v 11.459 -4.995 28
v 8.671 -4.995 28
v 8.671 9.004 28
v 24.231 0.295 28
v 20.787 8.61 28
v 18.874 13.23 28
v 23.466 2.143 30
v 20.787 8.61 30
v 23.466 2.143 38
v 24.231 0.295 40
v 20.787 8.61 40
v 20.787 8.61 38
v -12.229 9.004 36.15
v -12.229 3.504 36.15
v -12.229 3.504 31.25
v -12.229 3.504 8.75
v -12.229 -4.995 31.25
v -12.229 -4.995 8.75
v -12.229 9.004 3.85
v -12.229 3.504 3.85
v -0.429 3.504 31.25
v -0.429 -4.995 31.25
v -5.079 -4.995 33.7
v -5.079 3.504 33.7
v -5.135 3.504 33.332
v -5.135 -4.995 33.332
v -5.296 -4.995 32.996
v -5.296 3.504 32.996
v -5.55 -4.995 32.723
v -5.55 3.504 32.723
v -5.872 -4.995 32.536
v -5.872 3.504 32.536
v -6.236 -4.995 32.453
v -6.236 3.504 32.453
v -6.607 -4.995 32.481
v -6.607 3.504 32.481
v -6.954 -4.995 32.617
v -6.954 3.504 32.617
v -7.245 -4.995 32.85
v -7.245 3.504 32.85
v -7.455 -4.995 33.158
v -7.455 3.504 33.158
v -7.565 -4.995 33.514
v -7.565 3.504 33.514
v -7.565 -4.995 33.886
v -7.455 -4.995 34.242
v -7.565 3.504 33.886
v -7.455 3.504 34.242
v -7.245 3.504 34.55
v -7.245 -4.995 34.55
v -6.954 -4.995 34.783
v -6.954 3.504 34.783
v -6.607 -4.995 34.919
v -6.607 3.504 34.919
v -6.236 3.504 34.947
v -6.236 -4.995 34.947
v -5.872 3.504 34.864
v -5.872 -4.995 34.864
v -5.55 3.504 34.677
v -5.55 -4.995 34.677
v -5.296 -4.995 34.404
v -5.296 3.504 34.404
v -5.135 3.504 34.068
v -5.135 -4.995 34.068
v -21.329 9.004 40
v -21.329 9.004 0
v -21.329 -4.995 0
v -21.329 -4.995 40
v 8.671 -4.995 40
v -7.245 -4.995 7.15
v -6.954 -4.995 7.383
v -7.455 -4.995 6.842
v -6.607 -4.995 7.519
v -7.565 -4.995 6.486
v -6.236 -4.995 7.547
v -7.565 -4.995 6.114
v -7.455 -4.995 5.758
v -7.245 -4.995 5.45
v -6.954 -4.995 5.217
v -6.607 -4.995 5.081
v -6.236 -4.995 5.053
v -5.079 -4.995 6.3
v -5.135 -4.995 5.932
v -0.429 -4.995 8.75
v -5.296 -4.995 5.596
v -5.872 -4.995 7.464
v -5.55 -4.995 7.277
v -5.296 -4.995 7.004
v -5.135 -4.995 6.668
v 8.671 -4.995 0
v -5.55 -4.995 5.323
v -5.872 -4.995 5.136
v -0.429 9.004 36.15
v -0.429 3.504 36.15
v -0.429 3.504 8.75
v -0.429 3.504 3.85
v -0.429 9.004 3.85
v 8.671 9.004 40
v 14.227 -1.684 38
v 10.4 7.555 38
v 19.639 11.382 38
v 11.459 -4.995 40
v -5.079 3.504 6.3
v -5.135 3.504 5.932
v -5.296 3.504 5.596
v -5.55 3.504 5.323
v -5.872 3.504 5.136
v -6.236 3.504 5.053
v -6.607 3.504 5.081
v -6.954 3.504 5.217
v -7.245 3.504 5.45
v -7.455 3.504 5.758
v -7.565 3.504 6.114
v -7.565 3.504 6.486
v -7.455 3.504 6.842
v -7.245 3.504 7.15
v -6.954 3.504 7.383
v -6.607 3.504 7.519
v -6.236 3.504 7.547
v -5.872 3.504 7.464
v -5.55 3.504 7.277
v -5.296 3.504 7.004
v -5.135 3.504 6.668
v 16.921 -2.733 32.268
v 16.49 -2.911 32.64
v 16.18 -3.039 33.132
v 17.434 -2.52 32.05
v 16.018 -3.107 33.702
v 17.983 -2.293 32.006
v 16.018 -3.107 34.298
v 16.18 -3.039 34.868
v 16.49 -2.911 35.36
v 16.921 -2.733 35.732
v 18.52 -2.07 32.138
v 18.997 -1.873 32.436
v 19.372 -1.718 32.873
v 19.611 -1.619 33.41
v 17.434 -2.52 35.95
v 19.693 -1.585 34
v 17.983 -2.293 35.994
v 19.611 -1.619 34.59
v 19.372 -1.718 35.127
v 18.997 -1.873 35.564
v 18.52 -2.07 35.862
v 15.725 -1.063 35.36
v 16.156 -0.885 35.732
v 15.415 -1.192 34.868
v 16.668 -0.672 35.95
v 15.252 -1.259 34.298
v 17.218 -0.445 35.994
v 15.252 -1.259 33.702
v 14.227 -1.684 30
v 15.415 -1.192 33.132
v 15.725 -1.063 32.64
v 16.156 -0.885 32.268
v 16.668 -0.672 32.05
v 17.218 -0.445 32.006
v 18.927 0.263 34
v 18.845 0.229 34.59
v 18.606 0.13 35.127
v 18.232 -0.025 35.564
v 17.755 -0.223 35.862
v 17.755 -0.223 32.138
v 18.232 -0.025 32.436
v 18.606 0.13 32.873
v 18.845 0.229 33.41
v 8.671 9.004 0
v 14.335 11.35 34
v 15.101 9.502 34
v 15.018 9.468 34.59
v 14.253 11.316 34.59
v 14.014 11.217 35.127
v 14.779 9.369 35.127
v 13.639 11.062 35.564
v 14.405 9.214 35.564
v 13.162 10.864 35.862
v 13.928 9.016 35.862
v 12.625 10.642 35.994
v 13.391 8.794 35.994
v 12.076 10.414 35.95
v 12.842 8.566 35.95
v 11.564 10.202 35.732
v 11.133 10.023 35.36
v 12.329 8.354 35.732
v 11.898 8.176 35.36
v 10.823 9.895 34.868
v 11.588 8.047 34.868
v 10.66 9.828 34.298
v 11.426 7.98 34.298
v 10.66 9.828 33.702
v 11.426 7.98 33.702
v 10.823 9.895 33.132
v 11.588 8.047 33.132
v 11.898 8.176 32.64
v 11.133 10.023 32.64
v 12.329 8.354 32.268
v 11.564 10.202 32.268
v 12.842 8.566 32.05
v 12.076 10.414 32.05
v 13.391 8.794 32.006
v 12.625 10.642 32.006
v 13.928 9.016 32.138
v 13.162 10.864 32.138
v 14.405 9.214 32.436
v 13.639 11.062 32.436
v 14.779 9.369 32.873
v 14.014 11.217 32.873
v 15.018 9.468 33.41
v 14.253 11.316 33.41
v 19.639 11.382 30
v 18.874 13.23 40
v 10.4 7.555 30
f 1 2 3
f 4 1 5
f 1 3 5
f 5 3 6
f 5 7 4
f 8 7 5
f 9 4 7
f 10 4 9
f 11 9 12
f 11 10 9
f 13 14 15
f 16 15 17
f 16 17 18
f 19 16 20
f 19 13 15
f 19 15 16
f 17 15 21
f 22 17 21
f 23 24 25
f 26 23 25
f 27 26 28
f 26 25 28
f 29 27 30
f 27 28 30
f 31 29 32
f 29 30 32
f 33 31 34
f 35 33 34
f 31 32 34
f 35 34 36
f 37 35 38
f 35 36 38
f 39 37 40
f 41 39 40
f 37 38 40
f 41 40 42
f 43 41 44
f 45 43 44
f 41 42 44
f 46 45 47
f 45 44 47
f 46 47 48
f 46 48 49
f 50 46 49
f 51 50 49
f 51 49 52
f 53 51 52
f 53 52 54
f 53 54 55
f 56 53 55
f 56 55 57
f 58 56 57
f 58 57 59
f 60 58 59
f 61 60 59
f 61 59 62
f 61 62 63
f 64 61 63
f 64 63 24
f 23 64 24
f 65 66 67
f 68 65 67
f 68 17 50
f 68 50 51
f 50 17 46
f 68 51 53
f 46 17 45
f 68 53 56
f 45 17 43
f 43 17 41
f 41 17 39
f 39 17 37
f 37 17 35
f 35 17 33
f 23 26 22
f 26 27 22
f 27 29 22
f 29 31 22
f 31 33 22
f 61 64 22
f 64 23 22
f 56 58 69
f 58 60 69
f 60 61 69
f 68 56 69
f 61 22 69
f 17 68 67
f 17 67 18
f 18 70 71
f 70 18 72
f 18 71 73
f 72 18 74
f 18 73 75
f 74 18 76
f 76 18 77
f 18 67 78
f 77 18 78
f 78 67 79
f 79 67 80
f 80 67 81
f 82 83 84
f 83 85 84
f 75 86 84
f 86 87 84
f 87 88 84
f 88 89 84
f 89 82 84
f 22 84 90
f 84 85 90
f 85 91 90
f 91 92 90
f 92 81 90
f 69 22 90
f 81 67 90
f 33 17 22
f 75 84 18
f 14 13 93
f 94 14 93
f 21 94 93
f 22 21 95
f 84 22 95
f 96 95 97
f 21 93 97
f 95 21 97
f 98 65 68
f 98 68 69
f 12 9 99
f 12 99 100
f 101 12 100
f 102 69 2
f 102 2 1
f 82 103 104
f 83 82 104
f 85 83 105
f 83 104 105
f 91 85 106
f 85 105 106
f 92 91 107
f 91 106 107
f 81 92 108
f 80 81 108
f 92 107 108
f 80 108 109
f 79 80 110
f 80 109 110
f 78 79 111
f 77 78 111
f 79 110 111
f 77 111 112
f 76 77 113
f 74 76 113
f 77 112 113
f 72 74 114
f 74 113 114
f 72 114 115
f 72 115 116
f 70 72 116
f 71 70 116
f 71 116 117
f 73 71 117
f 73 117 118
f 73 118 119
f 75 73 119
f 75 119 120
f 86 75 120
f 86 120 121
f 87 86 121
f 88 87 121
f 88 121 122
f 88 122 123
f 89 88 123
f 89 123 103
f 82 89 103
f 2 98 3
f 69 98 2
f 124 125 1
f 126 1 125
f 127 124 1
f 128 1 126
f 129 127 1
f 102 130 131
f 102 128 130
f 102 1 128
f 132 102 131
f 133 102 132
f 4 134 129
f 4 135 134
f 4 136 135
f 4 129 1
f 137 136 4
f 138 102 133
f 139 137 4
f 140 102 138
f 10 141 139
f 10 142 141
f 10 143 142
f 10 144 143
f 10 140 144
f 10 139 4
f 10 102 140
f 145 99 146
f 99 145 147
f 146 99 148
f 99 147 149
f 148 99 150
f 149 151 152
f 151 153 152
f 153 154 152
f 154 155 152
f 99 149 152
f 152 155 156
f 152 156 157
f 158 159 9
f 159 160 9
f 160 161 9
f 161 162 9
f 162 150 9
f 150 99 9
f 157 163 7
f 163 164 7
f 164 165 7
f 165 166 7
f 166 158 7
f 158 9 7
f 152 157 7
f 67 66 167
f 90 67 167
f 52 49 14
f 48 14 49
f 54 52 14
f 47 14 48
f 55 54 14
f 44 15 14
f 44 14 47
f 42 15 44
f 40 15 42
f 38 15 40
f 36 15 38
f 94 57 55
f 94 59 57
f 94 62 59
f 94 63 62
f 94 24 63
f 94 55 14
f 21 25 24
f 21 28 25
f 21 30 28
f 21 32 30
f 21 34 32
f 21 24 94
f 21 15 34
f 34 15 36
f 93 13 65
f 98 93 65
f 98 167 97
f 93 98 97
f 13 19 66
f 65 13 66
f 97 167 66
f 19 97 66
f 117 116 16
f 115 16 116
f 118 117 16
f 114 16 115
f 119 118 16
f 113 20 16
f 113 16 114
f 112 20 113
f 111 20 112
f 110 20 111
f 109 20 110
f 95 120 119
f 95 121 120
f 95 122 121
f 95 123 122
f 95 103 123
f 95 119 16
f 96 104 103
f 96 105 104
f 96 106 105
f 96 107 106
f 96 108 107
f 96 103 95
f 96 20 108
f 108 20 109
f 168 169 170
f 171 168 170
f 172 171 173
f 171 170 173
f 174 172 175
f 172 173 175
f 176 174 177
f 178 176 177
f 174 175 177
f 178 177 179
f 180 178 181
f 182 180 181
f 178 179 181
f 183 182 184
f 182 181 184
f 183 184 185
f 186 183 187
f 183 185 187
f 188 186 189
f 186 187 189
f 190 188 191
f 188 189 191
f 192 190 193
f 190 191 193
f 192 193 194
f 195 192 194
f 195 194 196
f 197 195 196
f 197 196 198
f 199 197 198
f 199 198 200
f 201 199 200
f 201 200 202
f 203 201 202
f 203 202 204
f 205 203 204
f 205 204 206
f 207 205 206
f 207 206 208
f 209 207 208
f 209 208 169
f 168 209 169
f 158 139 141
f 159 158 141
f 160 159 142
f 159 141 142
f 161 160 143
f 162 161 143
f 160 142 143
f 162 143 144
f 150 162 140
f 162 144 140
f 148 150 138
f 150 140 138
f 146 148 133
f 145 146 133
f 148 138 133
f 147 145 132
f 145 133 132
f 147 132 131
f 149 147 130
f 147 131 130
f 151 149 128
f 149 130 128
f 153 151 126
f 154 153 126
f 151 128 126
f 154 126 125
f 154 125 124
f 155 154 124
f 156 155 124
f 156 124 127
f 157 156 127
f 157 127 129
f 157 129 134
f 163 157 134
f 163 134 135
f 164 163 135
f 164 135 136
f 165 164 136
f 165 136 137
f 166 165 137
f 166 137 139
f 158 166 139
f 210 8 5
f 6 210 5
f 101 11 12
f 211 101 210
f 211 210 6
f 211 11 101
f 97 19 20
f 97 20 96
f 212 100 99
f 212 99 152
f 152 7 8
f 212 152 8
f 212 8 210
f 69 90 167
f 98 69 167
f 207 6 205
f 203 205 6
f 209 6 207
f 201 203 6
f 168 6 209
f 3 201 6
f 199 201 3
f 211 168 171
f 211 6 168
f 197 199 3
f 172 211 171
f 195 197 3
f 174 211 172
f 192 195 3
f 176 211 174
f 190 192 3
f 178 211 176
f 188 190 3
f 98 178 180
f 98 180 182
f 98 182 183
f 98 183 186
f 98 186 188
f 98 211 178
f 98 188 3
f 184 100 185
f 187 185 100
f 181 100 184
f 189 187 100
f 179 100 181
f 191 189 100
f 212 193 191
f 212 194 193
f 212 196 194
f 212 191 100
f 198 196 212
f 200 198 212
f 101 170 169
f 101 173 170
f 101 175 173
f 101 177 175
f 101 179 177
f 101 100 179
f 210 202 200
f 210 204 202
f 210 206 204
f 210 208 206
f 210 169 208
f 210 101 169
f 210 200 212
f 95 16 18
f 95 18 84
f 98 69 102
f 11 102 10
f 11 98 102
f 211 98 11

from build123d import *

# Parameters (mm, degrees)
BOSS_EXTRUDE1_DEPTH = 40
SKETCH4_W           = 11.8
SKETCH4_H           = 32.3
CUT_EXTRUDE1_DEPTH  = 5.5
SKETCH5_W           = 11.8
SKETCH5_H           = 22.5
CUT_EXTRUDE2_DEPTH  = 9.498848241
SKETCH6_R           = 1.25
CUT_EXTRUDE3_DEPTH  = 9.498848241
BOSS_EXTRUDE2_DEPTH = 12
SKETCH8_R           = 2
CUT_EXTRUDE4_DEPTH  = 30.384991323
SKETCH9_W           = 8
SKETCH9_H           = 10
CUT_EXTRUDE5_DEPTH  = 10


with BuildPart() as part:
    # Sketch1 → Boss-Extrude1 (new body)
    with BuildSketch(Plane.XY):
        Polygon((8.670952565, 9.003587153), (-11.329047435, 9.003587153), (-21.329047435, 9.003587153), (-21.329047435, -4.995261088), (-11.329047435, -4.995261088), (8.670952565, -4.995261088), align=None)
    extrude(amount=BOSS_EXTRUDE1_DEPTH)

    # Sketch4 → Cut-Extrude1 (cut)
    with BuildSketch(Plane(origin=(0, 9.003587153, 0), x_dir=(1, 0, 0), z_dir=(0, 1, 0))):
        with Locations((-6.329047435, -20)):
            Rectangle(SKETCH4_W, SKETCH4_H)
    extrude(amount=-CUT_EXTRUDE1_DEPTH, mode=Mode.SUBTRACT)

    # Sketch5 → Cut-Extrude2 (cut, through all)
    with BuildSketch(Plane(origin=(0, 3.503587153, 0), x_dir=(1, 0, 0), z_dir=(0, 1, 0))):
        with Locations((-6.329047435, -20)):
            Rectangle(SKETCH5_W, SKETCH5_H)
    extrude(amount=-CUT_EXTRUDE2_DEPTH, mode=Mode.SUBTRACT)

    # Sketch6 → Cut-Extrude3 (cut, through all)
    with BuildSketch(Plane(origin=(0, 3.503587153, 0), x_dir=(1, 0, 0), z_dir=(0, 1, 0))):
        with Locations((-6.329047435, -6.3)):
            Circle(SKETCH6_R)
        with Locations((-6.329047435, -33.7)):
            Circle(SKETCH6_R)
    extrude(amount=-CUT_EXTRUDE3_DEPTH, mode=Mode.SUBTRACT)


with BuildPart() as body_2:
    # Sketch7 → Boss-Extrude2 (new body)
    with BuildSketch(Plane.XY.offset(40)):
        Polygon((20.787289482, 8.610377228), (18.87387232, 13.229774891), (8.670952565, 9.003587153), (8.670952565, -4.995261088), (11.458506302, -4.995261088), (24.231440373, 0.295461436), align=None)
    extrude(amount=-BOSS_EXTRUDE2_DEPTH)

    # Sketch8 → Cut-Extrude4 (cut, through all)
    with BuildSketch(Plane(origin=(3.444150891, -8.314915793, 0), x_dir=(0.923879533, 0.382683432, 0), z_dir=(0.382683432, -0.923879533, 0))):
        with Locations((15.587337893, 34)):
            Circle(SKETCH8_R)
    extrude(amount=-CUT_EXTRUDE4_DEPTH, mode=Mode.SUBTRACT)

    # Sketch9 → Cut-Extrude5 (cut)
    with BuildSketch(Plane(origin=(20.787289482, 8.610377228, 0), x_dir=(0, 0, -1), z_dir=(0.923879533, 0.382683432, 0))):
        with Locations((-34, -2)):
            Rectangle(SKETCH9_W, SKETCH9_H)
    extrude(amount=-CUT_EXTRUDE5_DEPTH, mode=Mode.SUBTRACT)


solid = Compound([part.part, body_2.part])
